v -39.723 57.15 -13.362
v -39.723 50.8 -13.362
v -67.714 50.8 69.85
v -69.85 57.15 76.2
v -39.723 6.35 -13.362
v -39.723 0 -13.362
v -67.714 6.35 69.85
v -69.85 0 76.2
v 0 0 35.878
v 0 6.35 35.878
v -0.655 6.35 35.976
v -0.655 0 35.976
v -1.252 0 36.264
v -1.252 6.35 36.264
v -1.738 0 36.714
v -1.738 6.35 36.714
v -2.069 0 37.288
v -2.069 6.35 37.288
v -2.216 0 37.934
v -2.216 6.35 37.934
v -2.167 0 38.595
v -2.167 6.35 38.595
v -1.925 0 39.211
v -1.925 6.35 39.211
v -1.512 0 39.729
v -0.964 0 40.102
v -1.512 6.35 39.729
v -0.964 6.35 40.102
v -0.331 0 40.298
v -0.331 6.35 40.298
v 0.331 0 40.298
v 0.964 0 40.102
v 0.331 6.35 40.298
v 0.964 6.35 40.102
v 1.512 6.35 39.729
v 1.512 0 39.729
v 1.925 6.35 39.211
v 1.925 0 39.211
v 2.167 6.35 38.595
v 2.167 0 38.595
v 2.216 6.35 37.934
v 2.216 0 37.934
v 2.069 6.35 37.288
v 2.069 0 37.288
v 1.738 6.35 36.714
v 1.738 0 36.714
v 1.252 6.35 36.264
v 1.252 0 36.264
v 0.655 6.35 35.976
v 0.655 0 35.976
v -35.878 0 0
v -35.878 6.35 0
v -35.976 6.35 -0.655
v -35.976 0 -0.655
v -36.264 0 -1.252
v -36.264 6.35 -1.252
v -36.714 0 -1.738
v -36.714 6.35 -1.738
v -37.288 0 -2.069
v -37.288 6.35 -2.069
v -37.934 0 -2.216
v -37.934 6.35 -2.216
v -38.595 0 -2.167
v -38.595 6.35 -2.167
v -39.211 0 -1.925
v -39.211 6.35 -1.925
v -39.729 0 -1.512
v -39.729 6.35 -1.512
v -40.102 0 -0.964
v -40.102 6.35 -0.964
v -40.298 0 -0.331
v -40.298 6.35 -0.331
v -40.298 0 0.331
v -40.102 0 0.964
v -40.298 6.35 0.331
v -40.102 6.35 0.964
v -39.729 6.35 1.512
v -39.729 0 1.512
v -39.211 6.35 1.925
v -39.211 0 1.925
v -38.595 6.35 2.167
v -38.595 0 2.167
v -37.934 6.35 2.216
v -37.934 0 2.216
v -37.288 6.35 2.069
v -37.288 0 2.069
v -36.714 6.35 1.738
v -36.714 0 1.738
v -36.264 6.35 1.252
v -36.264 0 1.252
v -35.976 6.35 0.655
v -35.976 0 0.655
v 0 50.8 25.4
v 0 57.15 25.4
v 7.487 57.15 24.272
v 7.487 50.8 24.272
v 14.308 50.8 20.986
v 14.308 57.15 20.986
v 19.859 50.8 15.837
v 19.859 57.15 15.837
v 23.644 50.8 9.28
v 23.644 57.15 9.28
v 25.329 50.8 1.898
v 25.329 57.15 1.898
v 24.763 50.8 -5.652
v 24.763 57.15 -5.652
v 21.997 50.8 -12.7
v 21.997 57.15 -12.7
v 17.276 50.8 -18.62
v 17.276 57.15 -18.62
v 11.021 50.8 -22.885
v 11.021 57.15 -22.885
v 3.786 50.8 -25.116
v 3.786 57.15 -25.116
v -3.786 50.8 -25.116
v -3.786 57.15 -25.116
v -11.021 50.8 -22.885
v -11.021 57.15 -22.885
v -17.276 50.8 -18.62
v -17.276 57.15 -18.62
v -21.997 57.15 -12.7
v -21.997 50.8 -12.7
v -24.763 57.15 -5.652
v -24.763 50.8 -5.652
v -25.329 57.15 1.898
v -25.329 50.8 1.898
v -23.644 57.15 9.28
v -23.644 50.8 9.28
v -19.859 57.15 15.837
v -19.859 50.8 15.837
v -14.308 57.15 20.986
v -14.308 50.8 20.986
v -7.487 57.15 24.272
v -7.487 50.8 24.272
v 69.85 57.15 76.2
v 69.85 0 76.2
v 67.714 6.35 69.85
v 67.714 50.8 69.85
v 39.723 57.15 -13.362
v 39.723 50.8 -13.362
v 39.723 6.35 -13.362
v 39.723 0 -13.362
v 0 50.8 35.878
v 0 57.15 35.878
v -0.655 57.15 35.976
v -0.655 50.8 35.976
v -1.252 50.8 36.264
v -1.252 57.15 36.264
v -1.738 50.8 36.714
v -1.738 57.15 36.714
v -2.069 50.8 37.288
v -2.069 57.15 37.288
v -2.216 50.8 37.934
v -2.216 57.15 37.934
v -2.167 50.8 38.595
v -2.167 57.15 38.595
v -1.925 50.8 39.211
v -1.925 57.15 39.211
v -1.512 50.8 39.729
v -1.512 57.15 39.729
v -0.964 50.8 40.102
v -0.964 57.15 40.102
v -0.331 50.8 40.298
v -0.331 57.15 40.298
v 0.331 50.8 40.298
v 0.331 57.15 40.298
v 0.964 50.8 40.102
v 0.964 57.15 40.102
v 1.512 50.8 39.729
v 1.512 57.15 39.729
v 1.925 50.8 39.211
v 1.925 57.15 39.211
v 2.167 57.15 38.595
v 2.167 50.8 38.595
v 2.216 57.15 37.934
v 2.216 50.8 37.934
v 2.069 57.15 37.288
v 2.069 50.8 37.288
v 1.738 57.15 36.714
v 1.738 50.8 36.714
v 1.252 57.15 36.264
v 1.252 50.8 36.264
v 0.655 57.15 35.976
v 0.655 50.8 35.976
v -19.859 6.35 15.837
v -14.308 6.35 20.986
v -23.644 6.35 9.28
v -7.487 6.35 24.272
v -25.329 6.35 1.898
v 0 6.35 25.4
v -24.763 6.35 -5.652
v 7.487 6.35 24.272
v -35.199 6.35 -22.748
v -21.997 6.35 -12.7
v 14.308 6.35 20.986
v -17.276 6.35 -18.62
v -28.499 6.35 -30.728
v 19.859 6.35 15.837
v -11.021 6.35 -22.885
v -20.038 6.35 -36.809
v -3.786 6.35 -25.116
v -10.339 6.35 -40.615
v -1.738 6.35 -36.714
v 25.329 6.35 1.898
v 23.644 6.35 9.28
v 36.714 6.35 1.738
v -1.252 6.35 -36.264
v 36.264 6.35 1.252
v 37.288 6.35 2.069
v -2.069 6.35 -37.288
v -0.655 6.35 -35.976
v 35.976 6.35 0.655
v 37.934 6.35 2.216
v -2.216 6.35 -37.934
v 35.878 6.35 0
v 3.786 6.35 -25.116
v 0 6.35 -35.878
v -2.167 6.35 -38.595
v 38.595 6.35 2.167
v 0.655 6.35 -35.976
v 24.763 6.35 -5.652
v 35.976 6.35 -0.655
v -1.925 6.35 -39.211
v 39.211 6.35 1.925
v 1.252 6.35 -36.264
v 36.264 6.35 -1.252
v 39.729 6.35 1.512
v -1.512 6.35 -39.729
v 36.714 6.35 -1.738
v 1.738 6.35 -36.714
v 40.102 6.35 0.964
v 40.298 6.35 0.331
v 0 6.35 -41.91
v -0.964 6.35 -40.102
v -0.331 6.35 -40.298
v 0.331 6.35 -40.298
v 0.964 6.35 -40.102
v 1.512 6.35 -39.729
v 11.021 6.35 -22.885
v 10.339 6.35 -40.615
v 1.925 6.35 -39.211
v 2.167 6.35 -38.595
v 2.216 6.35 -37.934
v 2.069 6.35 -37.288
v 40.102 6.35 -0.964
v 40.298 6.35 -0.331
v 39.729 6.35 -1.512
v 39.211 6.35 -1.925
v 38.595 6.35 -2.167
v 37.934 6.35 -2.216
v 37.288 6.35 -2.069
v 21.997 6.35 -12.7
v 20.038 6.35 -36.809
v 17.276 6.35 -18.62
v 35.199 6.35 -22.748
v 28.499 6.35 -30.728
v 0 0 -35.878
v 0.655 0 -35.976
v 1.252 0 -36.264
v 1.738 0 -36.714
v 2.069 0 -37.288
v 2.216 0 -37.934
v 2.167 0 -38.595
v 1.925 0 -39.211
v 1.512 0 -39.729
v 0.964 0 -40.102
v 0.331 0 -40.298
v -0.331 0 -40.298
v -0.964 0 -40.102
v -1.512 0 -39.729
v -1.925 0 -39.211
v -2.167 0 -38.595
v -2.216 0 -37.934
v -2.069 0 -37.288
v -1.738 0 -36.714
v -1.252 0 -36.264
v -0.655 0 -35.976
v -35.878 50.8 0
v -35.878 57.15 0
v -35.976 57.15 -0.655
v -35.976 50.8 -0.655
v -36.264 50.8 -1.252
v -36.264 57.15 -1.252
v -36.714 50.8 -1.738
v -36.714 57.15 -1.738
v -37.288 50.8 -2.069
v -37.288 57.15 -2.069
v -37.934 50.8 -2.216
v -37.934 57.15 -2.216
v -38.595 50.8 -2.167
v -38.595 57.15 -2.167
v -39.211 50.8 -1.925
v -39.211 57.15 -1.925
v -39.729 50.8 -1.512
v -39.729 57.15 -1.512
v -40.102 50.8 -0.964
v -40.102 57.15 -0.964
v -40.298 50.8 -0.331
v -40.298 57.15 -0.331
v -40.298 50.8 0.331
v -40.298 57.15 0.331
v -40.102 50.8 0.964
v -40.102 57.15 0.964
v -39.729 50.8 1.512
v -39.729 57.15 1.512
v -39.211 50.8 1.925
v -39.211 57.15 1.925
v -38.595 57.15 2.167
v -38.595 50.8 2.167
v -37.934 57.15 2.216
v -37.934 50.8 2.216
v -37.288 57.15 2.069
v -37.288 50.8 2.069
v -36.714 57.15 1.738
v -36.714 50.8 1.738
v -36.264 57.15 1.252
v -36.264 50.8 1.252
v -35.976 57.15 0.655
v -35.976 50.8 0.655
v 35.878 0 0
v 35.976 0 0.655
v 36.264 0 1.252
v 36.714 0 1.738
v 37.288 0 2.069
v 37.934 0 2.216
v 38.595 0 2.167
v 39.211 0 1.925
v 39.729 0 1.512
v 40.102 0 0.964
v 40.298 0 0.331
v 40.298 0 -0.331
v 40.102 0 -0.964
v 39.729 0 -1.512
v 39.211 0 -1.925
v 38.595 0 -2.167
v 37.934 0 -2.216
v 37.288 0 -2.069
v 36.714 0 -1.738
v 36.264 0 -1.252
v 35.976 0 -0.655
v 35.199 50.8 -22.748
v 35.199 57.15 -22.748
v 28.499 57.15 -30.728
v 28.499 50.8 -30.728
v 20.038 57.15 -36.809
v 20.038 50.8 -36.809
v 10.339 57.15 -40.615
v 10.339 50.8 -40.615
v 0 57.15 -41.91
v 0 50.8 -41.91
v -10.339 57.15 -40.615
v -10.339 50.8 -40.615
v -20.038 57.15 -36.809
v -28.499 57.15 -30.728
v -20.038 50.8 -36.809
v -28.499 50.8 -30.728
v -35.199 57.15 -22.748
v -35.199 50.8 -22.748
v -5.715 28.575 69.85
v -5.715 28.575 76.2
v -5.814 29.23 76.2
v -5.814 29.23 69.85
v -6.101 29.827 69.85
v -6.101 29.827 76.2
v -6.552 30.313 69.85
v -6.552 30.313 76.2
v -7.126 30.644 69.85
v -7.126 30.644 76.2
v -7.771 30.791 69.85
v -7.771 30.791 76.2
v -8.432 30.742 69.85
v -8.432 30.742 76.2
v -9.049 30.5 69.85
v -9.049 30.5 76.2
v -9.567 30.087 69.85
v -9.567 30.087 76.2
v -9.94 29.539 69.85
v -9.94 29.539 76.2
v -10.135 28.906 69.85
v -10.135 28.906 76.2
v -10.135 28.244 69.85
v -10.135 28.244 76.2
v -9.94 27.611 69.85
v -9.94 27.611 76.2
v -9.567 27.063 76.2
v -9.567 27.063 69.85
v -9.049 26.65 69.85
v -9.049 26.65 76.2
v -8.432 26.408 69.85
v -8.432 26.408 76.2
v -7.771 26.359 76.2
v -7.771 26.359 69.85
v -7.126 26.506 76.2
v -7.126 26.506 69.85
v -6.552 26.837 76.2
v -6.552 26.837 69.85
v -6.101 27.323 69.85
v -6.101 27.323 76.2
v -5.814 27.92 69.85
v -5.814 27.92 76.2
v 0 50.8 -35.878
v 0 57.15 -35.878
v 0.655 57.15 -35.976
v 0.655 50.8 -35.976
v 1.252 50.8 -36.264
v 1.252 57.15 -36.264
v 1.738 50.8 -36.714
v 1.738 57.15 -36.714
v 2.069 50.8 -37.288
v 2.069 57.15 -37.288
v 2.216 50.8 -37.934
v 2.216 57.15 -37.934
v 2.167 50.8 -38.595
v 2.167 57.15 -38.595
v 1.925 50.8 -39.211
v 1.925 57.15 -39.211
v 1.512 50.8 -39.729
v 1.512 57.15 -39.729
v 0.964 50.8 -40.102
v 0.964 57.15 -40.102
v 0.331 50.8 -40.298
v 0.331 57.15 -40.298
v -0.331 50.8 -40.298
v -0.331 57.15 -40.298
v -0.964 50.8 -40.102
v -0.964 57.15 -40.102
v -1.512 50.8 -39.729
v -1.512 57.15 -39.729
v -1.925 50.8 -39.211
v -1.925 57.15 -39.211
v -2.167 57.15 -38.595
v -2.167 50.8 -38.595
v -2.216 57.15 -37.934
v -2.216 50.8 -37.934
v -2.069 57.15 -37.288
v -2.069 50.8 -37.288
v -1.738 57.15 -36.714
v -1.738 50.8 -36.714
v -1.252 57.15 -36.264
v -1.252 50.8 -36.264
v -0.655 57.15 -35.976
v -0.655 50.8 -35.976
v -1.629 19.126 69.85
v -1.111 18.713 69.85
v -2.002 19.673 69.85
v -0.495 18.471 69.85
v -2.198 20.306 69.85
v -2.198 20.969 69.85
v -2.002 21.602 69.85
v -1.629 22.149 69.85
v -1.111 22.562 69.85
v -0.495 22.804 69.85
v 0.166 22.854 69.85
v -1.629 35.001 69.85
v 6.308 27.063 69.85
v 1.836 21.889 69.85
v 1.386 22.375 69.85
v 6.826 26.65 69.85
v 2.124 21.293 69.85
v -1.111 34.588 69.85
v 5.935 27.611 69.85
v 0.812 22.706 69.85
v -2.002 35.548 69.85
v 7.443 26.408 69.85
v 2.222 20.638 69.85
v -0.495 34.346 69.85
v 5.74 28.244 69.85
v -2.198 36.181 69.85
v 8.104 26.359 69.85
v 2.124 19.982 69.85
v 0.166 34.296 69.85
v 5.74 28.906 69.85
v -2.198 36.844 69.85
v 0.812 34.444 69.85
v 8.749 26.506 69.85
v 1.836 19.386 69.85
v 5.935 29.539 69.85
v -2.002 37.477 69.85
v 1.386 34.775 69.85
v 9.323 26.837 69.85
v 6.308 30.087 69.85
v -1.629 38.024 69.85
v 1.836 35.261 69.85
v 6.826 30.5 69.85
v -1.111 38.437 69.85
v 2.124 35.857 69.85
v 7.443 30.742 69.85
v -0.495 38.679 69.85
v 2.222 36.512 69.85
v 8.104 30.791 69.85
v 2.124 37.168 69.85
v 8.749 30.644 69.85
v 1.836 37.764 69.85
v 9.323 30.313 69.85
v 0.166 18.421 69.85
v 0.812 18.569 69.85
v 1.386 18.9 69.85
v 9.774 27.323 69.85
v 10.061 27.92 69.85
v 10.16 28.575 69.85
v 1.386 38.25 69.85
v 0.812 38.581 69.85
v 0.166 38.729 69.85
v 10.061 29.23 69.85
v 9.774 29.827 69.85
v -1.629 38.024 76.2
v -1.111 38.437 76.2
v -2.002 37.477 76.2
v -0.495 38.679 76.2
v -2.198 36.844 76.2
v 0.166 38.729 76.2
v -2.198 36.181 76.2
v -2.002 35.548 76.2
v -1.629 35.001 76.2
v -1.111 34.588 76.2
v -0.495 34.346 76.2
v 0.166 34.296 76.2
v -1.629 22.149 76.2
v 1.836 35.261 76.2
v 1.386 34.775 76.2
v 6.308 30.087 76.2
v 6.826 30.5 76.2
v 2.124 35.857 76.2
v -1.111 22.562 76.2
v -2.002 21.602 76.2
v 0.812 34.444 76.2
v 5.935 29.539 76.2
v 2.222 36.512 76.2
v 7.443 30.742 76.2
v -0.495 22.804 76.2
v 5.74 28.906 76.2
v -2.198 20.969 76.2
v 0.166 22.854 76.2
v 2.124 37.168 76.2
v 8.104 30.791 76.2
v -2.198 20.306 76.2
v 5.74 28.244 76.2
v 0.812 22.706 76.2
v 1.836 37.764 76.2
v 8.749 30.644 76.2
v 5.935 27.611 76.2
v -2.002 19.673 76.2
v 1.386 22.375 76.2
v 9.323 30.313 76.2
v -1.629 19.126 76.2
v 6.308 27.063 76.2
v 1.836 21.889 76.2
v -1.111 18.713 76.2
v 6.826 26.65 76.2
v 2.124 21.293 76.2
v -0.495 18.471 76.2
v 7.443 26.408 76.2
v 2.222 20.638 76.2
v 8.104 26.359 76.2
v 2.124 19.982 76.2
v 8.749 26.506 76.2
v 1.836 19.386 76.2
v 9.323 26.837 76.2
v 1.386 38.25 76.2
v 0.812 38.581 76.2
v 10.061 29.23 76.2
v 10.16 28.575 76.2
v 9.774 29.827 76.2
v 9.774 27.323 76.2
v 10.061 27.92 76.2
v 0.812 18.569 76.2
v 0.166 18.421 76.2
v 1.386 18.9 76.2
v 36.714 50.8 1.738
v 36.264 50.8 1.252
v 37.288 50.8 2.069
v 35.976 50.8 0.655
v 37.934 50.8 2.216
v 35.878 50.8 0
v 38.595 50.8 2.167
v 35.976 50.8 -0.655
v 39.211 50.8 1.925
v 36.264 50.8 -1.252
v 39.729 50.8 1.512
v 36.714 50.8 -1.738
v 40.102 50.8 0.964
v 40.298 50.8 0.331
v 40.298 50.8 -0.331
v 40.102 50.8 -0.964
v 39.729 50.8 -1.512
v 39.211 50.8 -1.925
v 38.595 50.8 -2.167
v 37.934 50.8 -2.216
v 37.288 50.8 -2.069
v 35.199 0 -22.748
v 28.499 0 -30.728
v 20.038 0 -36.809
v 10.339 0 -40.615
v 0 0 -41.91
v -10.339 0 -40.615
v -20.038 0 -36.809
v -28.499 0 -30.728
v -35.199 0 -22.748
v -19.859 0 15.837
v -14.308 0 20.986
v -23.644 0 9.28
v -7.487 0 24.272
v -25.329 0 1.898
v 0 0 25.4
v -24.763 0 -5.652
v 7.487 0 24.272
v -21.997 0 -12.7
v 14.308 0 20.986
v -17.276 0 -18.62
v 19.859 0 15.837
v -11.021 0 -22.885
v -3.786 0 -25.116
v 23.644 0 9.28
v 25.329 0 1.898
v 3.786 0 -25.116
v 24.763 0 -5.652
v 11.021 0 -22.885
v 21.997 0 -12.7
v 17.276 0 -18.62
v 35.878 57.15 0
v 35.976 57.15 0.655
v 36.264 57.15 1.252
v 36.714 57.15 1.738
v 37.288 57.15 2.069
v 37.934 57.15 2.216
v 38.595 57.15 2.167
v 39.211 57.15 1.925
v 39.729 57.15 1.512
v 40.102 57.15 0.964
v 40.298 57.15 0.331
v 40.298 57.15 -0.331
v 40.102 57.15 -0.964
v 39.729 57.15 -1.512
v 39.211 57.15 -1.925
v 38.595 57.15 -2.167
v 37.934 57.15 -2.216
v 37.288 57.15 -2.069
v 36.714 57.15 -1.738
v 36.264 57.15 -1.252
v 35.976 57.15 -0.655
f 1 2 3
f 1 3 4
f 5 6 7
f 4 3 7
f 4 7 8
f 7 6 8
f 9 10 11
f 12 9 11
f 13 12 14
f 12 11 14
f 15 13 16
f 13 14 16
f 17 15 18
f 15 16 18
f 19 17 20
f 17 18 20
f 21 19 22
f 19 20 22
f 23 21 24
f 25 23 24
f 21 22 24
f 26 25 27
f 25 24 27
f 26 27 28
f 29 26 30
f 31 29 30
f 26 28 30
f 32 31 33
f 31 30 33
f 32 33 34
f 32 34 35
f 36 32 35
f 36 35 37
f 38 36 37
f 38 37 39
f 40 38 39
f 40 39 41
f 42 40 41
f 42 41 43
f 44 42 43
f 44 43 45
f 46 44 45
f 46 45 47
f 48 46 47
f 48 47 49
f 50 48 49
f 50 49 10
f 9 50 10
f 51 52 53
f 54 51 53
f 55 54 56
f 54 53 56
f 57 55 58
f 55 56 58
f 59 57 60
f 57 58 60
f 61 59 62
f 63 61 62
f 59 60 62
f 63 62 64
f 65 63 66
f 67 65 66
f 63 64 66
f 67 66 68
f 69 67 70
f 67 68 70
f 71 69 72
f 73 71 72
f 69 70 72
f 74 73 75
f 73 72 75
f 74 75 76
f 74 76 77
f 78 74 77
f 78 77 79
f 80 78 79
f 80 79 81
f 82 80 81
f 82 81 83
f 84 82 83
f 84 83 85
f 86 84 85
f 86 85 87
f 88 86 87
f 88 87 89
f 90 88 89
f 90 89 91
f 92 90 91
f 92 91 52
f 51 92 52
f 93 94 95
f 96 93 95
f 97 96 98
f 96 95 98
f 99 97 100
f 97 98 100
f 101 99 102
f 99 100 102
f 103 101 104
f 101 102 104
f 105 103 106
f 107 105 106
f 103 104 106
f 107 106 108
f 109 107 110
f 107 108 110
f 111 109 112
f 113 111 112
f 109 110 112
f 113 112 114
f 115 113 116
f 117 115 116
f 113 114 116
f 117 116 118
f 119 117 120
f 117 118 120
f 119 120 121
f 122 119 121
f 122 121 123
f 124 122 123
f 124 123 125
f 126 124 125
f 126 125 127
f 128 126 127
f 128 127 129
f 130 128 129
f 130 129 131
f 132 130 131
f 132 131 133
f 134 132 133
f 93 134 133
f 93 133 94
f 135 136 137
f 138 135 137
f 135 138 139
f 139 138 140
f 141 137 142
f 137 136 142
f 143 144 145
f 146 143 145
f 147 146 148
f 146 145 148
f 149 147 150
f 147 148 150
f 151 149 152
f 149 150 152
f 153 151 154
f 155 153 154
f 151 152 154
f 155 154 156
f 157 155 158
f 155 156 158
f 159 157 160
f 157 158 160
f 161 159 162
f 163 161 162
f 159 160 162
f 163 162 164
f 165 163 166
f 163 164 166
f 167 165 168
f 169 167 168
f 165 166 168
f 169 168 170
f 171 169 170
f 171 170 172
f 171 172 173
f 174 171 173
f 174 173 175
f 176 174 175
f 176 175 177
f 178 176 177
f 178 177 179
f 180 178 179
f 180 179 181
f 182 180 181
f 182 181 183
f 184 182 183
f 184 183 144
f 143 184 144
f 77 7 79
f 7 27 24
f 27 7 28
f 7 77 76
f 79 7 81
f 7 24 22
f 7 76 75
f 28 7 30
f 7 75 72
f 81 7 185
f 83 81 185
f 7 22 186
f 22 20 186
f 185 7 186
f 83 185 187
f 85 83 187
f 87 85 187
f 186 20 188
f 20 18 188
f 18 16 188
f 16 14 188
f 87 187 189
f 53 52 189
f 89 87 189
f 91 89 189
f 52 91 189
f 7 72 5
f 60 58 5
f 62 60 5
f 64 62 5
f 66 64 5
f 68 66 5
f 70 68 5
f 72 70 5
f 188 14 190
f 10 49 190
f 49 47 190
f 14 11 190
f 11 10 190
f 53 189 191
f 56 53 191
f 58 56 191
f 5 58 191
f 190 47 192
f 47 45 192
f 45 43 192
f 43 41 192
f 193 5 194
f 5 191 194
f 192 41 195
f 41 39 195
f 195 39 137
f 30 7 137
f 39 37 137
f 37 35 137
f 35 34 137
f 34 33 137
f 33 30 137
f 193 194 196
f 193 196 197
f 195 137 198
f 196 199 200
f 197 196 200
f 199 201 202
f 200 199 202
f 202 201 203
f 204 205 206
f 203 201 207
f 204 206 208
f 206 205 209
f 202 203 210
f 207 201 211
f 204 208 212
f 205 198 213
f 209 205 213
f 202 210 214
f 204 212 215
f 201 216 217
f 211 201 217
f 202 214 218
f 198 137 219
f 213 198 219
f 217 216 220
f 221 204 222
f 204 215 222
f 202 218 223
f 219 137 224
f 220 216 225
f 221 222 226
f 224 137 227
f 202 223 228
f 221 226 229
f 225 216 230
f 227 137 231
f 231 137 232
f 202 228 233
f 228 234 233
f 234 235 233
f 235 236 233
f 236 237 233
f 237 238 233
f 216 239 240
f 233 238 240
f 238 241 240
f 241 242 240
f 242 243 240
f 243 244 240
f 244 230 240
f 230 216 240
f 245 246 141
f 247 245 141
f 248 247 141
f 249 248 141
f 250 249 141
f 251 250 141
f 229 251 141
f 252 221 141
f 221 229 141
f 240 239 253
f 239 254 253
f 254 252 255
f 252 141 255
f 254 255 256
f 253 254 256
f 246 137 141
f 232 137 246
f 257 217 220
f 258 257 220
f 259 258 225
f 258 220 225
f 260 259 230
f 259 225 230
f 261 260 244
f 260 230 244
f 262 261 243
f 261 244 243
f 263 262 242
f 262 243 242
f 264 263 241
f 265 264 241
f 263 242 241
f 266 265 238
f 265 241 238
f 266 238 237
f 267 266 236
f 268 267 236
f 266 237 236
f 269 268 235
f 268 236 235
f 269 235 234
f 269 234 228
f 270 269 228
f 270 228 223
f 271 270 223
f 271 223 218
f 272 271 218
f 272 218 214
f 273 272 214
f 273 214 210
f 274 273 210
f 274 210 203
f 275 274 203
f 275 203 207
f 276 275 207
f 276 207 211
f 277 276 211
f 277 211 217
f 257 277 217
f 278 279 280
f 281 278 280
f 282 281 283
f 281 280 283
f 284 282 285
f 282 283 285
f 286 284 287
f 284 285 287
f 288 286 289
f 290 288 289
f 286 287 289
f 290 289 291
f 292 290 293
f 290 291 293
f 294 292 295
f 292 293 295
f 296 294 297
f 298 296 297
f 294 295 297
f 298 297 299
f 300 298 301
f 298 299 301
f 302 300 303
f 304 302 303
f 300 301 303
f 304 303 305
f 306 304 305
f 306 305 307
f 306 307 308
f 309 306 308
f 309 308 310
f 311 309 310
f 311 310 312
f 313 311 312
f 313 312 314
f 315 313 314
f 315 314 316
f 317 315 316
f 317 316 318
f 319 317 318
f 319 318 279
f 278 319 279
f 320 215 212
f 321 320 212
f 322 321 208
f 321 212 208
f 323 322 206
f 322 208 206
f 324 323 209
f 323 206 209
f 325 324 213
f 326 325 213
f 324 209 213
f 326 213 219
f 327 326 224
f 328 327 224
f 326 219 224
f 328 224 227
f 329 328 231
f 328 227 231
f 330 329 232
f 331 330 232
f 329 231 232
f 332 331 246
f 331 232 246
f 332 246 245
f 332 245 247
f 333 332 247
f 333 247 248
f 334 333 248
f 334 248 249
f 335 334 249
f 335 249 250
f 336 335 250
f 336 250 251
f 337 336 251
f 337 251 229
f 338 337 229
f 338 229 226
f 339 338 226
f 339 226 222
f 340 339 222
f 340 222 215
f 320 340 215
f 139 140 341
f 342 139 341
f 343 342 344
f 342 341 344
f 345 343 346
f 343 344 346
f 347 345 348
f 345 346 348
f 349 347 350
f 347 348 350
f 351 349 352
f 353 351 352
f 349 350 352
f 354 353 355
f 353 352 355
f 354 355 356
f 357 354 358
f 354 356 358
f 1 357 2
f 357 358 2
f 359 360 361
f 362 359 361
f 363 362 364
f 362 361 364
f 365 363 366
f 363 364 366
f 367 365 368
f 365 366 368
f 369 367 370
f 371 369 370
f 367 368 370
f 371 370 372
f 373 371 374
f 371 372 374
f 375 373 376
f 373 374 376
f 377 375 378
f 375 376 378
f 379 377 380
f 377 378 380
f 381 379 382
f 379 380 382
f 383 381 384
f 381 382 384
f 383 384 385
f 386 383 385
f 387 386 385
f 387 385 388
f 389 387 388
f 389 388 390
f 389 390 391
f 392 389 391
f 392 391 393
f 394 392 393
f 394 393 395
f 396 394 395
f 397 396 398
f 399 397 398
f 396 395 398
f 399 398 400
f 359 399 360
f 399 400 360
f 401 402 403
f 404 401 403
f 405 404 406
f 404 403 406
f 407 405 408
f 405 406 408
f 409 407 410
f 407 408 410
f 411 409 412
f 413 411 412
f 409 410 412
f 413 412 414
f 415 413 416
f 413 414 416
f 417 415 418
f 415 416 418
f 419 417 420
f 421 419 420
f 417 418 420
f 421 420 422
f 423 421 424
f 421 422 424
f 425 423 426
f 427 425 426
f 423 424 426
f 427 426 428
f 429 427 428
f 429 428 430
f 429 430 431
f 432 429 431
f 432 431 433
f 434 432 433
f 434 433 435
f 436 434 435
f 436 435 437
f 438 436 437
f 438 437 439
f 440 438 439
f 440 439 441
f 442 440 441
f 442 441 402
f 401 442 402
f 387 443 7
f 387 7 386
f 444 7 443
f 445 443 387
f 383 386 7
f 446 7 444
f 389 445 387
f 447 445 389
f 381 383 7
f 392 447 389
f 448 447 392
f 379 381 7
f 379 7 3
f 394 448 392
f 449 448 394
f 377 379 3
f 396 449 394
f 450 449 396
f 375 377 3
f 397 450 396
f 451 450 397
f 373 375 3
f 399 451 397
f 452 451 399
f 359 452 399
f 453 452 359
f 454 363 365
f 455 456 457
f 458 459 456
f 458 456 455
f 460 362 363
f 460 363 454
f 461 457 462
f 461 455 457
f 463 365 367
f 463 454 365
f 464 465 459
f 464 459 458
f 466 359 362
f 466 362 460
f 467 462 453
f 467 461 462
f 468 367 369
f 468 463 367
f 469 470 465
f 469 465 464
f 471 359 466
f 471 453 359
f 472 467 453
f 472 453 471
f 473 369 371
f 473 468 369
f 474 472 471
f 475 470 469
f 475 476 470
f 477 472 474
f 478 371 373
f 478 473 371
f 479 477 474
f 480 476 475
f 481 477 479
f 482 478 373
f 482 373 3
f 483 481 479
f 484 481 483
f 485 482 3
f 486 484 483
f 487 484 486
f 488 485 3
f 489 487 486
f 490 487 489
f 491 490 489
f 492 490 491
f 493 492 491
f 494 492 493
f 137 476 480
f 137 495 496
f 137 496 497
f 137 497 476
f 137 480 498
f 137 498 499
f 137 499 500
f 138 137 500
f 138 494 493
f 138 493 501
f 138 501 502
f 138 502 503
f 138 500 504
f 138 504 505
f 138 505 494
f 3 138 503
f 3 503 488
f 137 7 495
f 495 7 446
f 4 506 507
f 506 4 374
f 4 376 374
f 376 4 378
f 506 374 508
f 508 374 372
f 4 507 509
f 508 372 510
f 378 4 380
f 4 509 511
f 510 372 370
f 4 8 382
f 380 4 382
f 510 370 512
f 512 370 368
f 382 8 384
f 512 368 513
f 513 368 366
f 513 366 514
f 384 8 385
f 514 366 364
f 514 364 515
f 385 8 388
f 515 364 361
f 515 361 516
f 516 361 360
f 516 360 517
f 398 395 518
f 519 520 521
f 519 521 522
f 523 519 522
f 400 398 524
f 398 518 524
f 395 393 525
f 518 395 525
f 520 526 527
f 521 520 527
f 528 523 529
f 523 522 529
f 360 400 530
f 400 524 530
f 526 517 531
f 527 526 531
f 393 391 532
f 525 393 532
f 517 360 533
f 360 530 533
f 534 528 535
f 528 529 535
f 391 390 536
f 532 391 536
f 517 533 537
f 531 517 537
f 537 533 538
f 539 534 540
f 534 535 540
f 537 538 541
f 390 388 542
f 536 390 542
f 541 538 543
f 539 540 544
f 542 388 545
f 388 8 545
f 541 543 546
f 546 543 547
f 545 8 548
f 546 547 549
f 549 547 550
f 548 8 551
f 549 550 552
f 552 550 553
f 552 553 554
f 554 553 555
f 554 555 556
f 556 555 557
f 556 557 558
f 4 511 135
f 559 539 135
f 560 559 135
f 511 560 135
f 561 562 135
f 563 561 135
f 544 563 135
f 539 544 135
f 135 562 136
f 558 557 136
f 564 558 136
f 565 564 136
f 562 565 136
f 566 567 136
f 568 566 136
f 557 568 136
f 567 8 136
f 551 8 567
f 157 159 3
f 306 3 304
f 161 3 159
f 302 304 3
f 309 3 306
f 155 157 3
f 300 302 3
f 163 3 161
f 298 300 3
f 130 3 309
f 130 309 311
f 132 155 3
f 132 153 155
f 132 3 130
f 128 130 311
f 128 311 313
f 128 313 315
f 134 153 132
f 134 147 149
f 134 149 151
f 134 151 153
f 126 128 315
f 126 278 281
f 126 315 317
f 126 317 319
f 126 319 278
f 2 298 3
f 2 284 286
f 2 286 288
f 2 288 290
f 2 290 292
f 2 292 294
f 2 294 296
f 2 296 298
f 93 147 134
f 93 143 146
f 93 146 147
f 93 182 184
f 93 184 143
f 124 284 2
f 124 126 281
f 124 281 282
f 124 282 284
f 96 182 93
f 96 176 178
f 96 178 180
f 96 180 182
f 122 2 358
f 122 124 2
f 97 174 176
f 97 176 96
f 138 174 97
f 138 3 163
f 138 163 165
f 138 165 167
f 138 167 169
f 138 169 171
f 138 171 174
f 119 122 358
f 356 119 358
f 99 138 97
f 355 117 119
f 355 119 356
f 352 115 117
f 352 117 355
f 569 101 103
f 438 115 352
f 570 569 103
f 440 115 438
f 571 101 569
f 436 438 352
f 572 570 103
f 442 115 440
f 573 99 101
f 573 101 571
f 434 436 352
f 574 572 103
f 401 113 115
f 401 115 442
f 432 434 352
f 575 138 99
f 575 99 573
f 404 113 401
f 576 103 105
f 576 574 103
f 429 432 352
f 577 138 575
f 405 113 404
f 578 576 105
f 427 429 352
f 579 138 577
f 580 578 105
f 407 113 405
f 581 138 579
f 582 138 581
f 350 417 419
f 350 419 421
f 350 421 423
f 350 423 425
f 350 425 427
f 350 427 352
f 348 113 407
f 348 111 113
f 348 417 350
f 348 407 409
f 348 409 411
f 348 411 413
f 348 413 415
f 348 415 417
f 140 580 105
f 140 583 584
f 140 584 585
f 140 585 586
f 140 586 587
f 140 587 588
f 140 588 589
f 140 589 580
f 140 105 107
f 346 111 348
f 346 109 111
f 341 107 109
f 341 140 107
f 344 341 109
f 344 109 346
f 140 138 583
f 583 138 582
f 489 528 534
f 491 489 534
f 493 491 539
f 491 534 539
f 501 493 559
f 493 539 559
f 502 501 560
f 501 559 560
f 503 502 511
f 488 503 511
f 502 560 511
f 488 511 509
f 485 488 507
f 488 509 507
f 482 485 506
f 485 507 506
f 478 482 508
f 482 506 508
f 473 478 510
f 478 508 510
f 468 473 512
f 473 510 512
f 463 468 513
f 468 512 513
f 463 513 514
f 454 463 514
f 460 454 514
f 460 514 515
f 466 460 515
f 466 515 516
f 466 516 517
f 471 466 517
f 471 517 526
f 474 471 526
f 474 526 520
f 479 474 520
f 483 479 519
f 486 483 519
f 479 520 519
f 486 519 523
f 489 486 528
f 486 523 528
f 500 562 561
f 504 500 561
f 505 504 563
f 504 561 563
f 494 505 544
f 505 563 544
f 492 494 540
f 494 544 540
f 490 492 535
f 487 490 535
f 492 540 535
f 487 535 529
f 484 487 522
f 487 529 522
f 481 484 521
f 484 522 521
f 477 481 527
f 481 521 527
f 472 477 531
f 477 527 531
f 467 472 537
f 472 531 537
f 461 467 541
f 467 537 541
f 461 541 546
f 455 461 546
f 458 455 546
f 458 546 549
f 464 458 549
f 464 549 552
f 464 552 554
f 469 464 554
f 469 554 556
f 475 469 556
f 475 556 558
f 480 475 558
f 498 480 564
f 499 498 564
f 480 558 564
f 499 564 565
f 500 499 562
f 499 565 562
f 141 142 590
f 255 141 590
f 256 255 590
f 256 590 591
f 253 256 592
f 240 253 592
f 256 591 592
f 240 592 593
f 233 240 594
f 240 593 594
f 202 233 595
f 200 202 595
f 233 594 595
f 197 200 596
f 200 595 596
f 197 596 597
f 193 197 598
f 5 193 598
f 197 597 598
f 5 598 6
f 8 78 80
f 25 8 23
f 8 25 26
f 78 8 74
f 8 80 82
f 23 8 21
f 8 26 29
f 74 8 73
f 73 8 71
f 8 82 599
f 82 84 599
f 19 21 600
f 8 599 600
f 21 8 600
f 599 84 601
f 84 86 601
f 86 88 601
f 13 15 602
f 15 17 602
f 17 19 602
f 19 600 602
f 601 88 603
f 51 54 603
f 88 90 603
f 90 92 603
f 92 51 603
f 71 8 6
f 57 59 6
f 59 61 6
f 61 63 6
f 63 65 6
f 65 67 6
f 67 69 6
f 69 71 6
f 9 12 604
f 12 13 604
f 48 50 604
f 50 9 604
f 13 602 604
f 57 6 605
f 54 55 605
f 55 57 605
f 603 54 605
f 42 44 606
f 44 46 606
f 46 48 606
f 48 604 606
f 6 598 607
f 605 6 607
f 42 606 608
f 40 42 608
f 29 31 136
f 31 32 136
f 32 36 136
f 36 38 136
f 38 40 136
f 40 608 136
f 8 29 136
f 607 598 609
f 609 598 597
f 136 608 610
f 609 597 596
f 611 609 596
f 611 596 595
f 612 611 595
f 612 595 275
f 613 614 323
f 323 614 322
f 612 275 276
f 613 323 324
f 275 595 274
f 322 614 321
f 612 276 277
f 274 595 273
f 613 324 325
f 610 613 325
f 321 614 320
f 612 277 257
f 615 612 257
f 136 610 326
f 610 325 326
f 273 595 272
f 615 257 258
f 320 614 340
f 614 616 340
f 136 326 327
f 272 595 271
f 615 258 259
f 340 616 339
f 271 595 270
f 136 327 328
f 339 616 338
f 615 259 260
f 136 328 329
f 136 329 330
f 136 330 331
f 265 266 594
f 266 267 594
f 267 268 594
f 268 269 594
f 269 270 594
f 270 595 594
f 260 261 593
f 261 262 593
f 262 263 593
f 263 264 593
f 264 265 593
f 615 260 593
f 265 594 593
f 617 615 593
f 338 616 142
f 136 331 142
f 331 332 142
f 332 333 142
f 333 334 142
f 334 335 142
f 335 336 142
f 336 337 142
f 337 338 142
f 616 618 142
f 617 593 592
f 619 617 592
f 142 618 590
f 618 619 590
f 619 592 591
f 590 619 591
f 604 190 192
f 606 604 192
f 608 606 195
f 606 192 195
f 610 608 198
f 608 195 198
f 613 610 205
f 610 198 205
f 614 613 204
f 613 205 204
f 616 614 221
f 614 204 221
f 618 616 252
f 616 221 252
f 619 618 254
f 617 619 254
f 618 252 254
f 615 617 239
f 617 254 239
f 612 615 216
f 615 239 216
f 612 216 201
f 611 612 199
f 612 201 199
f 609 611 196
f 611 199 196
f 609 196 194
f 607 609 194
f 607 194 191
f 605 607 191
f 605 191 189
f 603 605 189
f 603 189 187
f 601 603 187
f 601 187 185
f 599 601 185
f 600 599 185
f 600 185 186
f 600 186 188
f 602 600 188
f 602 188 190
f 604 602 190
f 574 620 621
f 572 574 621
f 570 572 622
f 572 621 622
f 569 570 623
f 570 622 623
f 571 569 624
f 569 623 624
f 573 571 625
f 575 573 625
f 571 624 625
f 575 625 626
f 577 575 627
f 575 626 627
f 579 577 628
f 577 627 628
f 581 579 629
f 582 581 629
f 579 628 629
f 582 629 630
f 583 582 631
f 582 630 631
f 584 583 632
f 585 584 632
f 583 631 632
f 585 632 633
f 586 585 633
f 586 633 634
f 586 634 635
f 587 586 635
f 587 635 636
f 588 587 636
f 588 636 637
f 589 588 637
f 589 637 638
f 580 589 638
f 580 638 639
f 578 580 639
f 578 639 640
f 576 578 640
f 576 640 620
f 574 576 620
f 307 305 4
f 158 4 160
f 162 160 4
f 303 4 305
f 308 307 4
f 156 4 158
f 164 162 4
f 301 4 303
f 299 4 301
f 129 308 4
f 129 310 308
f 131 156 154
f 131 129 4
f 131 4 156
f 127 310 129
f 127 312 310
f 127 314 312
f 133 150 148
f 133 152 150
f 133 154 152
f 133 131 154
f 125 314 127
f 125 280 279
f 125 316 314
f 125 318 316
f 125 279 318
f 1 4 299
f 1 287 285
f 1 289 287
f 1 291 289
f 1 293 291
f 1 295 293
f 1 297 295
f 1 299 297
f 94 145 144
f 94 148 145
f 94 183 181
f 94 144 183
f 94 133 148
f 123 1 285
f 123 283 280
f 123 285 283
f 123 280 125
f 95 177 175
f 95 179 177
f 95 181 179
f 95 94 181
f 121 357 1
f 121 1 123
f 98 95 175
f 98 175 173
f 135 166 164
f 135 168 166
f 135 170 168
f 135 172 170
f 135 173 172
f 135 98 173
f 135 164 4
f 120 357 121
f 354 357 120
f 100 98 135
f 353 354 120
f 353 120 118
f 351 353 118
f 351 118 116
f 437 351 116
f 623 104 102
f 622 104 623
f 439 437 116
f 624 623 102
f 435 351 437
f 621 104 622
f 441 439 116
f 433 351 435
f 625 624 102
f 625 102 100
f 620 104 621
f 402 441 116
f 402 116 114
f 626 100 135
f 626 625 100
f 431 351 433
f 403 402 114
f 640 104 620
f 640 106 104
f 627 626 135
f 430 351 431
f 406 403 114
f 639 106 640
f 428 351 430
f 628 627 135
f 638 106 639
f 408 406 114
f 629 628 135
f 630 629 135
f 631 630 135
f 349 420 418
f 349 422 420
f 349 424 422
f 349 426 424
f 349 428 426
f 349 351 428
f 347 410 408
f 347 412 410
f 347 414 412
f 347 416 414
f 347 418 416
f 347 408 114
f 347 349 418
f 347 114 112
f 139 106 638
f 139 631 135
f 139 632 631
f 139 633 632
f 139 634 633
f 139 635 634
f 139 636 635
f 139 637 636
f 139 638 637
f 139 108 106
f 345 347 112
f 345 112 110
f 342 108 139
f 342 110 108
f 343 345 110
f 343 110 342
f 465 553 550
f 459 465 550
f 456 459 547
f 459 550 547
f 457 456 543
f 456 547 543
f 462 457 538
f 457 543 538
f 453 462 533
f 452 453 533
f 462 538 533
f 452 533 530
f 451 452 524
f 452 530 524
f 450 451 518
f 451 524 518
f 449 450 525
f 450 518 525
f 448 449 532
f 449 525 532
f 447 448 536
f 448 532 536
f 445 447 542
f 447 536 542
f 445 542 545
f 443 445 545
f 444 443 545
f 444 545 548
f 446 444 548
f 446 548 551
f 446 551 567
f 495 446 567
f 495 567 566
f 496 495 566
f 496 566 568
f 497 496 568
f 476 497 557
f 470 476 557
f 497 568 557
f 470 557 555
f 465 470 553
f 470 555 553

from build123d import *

# Parameters (mm, degrees)
BOSS_EXTRUDE1_DEPTH            = 57.15
SKETCH2_R                      = 25.4
CUT_EXTRUDE1_DEPTH             = 57.15
SKETCH3_R                      = 2.2225
CUT_EXTRUDE2_DEPTH             = 57.15
CIRPATTERN1_COUNT              = 4
CUT_EXTRUDE3_REACH             = 120.117
SKETCH4_W                      = 111.76
SKETCH4_H                      = 44.45
CUT_EXTRUDE3_DIRECTION_2_REACH = 120.117
SKETCH5_R                      = 2.2225
CUT_EXTRUDE4_DEPTH             = 6.35


with BuildPart() as part:
    # Sketch1 → Boss-Extrude1 (new body)
    with BuildSketch(Plane(origin=(0, 0, 0), x_dir=(1, 0, 0), z_dir=(0, 1, 0))):
        with BuildLine():
            Line((-39.722823422, 13.362088137), (-69.85, -76.2))
            Line((-69.85, -76.2), (69.85, -76.2))
            Line((69.85, -76.2), (39.722823422, 13.362088137))
            ThreePointArc((39.722823422, 13.362088137), (0, 41.91), (-39.722823422, 13.362088137))
        make_face()
    extrude(amount=BOSS_EXTRUDE1_DEPTH)

    # Sketch2 → Cut-Extrude1 (cut)
    with BuildSketch(Plane(origin=(0, 57.15, 0), x_dir=(1, 0, 0), z_dir=(0, 1, 0))):
        with Locations(Location((0, 0, 0), (0, 0, 270))):
            Circle(SKETCH2_R)
    extrude(amount=-CUT_EXTRUDE1_DEPTH, mode=Mode.SUBTRACT)

    # Sketch3 → Cut-Extrude2 (cut)
    with BuildSketch(Plane(origin=(0, 57.15, 0), x_dir=(1, 0, 0), z_dir=(0, 1, 0))):
        with Locations(Location((0, 38.1, 0), (0, 0, 270))):
            Circle(SKETCH3_R)
    cut_extrude2 = extrude(amount=-CUT_EXTRUDE2_DEPTH, mode=Mode.SUBTRACT)

    # CirPattern1: Cut-Extrude2 ×4 about axis
    cirpattern1_axis = Axis((0, 0, 0), (0, 1, 0))
    for i in range(1, CIRPATTERN1_COUNT):
        add(cut_extrude2.rotate(cirpattern1_axis, i * 360 / CIRPATTERN1_COUNT), mode=Mode.SUBTRACT)

    # Cut-Extrude3: up to this plane
    cut_extrude3_end = Plane(origin=(-39.722823422, 57.15, -13.362088137), z_dir=(0.9478125369142922, 0, 0.318828158838101))
    # Sketch4 → Cut-Extrude3 (cut, up to the surface)
    with BuildSketch(Plane(origin=(0, 0, 0), x_dir=(0, 0, -1), z_dir=(1, 0, 0)), mode=Mode.PRIVATE) as cut_extrude3_sk1:
        with Locations((-13.97, 28.575)):
            Rectangle(SKETCH4_W, SKETCH4_H)
    cut_extrude3_tool1 = split(extrude(cut_extrude3_sk1.sketch, amount=-CUT_EXTRUDE3_REACH, mode=Mode.PRIVATE), bisect_by=cut_extrude3_end, keep=Keep.BOTH, mode=Mode.PRIVATE)
    add(cut_extrude3_tool1.solids().sort_by_distance((0, 28.575, 13.97))[0], mode=Mode.SUBTRACT)

    # Cut-Extrude3 direction 2: up to this plane
    cut_extrude3_direction_2_end = Plane(origin=(39.722823422, 57.15, -13.362088137), z_dir=(0.9478125369142922, 0, -0.318828158838101))
    # Sketch4 → Cut-Extrude3 direction 2 (cut, up to the surface)
    with BuildSketch(Plane(origin=(0, 0, 0), x_dir=(0, 0, -1), z_dir=(1, 0, 0)), mode=Mode.PRIVATE) as cut_extrude3_direction_2_sk1:
        with Locations((-13.97, 28.575)):
            Rectangle(SKETCH4_W, SKETCH4_H)
    cut_extrude3_direction_2_tool1 = split(extrude(cut_extrude3_direction_2_sk1.sketch, amount=CUT_EXTRUDE3_DIRECTION_2_REACH, mode=Mode.PRIVATE), bisect_by=cut_extrude3_direction_2_end, keep=Keep.BOTH, mode=Mode.PRIVATE)
    add(cut_extrude3_direction_2_tool1.solids().sort_by_distance((0, 28.575, 13.97))[0], mode=Mode.SUBTRACT)

    # Sketch5 → Cut-Extrude4 (cut)
    with BuildSketch(Plane.XY.offset(76.2)):
        with Locations((0, 36.5125)):
            Circle(SKETCH5_R)
        with Locations((-7.9375, 28.575)):
            Circle(SKETCH5_R)
        with Locations((0, 20.6375)):
            Circle(SKETCH5_R)
        with Locations((7.9375, 28.575)):
            Circle(SKETCH5_R)
    extrude(amount=-CUT_EXTRUDE4_DEPTH, mode=Mode.SUBTRACT)


solid = part.part
